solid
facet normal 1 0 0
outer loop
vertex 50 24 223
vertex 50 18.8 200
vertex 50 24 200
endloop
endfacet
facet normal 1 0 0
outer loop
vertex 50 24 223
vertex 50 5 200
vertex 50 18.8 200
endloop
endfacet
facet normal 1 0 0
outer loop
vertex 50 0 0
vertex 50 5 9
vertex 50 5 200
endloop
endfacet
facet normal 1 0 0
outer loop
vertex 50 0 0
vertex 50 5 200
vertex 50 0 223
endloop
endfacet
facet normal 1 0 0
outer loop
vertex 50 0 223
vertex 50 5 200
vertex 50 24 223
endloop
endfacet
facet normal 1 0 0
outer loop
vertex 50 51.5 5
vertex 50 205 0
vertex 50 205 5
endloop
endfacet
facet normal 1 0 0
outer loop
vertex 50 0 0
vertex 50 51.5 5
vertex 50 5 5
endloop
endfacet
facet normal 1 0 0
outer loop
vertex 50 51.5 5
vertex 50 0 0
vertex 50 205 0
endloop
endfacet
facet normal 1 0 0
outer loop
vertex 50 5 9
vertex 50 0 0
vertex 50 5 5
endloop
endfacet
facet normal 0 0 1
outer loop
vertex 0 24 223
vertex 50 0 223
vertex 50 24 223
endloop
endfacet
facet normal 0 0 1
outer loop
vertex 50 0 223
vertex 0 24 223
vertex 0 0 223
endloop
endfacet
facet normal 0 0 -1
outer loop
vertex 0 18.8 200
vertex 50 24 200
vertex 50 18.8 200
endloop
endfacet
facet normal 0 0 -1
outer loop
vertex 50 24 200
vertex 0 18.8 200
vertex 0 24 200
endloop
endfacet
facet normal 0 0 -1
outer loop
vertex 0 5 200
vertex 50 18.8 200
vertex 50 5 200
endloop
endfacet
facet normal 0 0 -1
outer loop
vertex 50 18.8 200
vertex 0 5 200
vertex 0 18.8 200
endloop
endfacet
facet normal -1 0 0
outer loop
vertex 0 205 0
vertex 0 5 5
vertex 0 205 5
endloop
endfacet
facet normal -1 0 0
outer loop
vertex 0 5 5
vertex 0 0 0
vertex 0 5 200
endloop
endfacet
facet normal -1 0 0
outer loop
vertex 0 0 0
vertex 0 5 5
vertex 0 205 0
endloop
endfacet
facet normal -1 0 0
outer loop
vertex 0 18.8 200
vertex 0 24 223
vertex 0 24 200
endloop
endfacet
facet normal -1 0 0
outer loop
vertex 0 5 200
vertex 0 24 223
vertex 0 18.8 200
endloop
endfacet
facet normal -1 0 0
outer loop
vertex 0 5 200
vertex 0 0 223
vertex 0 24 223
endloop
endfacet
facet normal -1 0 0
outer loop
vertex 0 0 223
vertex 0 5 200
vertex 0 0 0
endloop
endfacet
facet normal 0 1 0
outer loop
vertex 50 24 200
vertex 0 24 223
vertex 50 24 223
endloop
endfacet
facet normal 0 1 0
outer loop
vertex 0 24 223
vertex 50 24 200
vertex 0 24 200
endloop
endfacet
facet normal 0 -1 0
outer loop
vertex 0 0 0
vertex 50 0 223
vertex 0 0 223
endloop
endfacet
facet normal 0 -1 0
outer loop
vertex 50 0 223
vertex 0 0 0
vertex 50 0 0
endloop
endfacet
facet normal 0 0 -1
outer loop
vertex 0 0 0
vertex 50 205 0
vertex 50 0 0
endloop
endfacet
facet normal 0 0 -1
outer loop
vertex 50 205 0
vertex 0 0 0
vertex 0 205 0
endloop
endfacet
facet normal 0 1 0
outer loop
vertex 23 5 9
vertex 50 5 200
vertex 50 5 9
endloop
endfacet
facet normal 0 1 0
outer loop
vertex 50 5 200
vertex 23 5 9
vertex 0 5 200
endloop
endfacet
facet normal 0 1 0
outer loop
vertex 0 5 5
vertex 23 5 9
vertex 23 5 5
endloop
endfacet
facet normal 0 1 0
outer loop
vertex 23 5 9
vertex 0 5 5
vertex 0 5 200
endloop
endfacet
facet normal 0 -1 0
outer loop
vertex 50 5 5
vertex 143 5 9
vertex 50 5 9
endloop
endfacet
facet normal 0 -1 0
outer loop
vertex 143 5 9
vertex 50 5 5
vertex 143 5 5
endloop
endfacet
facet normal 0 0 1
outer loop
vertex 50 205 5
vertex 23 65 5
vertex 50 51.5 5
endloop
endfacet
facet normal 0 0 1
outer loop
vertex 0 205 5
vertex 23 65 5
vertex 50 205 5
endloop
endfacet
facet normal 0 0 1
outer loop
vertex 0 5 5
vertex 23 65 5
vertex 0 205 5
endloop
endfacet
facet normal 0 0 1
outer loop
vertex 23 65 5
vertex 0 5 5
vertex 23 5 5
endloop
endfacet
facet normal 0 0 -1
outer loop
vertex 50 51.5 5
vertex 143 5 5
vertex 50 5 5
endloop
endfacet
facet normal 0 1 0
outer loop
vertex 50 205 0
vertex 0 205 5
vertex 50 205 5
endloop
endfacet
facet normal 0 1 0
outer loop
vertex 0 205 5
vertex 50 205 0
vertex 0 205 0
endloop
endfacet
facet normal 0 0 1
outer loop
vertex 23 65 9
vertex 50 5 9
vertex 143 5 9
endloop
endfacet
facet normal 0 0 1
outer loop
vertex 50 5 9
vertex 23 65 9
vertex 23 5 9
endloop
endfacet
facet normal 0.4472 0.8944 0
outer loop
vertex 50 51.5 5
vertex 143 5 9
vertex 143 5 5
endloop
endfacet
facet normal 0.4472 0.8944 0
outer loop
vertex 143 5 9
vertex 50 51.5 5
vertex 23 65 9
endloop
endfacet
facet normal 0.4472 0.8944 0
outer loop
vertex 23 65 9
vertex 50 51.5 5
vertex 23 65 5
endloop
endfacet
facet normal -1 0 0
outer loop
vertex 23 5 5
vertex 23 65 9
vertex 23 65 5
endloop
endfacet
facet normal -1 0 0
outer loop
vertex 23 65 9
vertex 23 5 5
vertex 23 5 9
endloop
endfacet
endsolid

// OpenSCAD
// ============================================================
// Wall-Mounted Shelf Bracket — French Cleat + L-Bracket
// ============================================================
// Compatible with French cleat wall system (19mm plywood cleats).
// Can also be screwed directly to wall studs.

// ---- PARAMETERS ----
shelf_depth  = 200;   // How deep the shelf extends from wall (mm)
shelf_w      = 50;    // Width of one bracket (multiple = longer shelf)
shelf_load   = 5000;  // Expected load in grams — used in thickness calc
wall_t       = 5;     // Wall thickness of bracket
gusset_t     = 4;     // Diagonal gusset thickness

// French cleat dimensions (standard, don't change unless your cleats differ)
cleat_t      = 19;    // Cleat material thickness (mm)
cleat_angle  = 45;    // Cleat angle (degrees)
hook_clearance = 1;   // Clearance over cleat top

// ---- DERIVED ----
hook_h = cleat_t + hook_clearance + 3;

// ---- BACK PLATE ----
module back_plate() {
    cube([shelf_w, wall_t, shelf_depth + hook_h]);
}

// ---- SHELF ARM ----
module shelf_arm() {
    translate([0, wall_t, 0])
        cube([shelf_w, shelf_depth, wall_t]);
}

// ---- DIAGONAL GUSSET ----
// Triangular support under shelf arm
module gusset() {
    gusset_depth = shelf_depth * 0.6;
    translate([shelf_w/2 - gusset_t/2, wall_t, wall_t])
    linear_extrude(gusset_t)
    polygon([[0, 0], [gusset_depth, 0], [0, gusset_depth * 0.5]]);
}

// ---- FRENCH CLEAT HOOK ----
// Hook that slides over wall cleat
module cleat_hook() {
    translate([0, 0, shelf_depth])
    difference() {
        cube([shelf_w, cleat_t + wall_t, hook_h]);
        // 45° undercut to grab the cleat
        translate([0, wall_t, 0])
        rotate([0, 90, 0])
        linear_extrude(shelf_w)
        polygon([[0, 0], [cleat_t, 0], [cleat_t, hook_h], [0, hook_h * 0.6]]);
    }
}

// ---- ASSEMBLE ----
union() {
    back_plate();
    shelf_arm();
    gusset();
    cleat_hook();
}
